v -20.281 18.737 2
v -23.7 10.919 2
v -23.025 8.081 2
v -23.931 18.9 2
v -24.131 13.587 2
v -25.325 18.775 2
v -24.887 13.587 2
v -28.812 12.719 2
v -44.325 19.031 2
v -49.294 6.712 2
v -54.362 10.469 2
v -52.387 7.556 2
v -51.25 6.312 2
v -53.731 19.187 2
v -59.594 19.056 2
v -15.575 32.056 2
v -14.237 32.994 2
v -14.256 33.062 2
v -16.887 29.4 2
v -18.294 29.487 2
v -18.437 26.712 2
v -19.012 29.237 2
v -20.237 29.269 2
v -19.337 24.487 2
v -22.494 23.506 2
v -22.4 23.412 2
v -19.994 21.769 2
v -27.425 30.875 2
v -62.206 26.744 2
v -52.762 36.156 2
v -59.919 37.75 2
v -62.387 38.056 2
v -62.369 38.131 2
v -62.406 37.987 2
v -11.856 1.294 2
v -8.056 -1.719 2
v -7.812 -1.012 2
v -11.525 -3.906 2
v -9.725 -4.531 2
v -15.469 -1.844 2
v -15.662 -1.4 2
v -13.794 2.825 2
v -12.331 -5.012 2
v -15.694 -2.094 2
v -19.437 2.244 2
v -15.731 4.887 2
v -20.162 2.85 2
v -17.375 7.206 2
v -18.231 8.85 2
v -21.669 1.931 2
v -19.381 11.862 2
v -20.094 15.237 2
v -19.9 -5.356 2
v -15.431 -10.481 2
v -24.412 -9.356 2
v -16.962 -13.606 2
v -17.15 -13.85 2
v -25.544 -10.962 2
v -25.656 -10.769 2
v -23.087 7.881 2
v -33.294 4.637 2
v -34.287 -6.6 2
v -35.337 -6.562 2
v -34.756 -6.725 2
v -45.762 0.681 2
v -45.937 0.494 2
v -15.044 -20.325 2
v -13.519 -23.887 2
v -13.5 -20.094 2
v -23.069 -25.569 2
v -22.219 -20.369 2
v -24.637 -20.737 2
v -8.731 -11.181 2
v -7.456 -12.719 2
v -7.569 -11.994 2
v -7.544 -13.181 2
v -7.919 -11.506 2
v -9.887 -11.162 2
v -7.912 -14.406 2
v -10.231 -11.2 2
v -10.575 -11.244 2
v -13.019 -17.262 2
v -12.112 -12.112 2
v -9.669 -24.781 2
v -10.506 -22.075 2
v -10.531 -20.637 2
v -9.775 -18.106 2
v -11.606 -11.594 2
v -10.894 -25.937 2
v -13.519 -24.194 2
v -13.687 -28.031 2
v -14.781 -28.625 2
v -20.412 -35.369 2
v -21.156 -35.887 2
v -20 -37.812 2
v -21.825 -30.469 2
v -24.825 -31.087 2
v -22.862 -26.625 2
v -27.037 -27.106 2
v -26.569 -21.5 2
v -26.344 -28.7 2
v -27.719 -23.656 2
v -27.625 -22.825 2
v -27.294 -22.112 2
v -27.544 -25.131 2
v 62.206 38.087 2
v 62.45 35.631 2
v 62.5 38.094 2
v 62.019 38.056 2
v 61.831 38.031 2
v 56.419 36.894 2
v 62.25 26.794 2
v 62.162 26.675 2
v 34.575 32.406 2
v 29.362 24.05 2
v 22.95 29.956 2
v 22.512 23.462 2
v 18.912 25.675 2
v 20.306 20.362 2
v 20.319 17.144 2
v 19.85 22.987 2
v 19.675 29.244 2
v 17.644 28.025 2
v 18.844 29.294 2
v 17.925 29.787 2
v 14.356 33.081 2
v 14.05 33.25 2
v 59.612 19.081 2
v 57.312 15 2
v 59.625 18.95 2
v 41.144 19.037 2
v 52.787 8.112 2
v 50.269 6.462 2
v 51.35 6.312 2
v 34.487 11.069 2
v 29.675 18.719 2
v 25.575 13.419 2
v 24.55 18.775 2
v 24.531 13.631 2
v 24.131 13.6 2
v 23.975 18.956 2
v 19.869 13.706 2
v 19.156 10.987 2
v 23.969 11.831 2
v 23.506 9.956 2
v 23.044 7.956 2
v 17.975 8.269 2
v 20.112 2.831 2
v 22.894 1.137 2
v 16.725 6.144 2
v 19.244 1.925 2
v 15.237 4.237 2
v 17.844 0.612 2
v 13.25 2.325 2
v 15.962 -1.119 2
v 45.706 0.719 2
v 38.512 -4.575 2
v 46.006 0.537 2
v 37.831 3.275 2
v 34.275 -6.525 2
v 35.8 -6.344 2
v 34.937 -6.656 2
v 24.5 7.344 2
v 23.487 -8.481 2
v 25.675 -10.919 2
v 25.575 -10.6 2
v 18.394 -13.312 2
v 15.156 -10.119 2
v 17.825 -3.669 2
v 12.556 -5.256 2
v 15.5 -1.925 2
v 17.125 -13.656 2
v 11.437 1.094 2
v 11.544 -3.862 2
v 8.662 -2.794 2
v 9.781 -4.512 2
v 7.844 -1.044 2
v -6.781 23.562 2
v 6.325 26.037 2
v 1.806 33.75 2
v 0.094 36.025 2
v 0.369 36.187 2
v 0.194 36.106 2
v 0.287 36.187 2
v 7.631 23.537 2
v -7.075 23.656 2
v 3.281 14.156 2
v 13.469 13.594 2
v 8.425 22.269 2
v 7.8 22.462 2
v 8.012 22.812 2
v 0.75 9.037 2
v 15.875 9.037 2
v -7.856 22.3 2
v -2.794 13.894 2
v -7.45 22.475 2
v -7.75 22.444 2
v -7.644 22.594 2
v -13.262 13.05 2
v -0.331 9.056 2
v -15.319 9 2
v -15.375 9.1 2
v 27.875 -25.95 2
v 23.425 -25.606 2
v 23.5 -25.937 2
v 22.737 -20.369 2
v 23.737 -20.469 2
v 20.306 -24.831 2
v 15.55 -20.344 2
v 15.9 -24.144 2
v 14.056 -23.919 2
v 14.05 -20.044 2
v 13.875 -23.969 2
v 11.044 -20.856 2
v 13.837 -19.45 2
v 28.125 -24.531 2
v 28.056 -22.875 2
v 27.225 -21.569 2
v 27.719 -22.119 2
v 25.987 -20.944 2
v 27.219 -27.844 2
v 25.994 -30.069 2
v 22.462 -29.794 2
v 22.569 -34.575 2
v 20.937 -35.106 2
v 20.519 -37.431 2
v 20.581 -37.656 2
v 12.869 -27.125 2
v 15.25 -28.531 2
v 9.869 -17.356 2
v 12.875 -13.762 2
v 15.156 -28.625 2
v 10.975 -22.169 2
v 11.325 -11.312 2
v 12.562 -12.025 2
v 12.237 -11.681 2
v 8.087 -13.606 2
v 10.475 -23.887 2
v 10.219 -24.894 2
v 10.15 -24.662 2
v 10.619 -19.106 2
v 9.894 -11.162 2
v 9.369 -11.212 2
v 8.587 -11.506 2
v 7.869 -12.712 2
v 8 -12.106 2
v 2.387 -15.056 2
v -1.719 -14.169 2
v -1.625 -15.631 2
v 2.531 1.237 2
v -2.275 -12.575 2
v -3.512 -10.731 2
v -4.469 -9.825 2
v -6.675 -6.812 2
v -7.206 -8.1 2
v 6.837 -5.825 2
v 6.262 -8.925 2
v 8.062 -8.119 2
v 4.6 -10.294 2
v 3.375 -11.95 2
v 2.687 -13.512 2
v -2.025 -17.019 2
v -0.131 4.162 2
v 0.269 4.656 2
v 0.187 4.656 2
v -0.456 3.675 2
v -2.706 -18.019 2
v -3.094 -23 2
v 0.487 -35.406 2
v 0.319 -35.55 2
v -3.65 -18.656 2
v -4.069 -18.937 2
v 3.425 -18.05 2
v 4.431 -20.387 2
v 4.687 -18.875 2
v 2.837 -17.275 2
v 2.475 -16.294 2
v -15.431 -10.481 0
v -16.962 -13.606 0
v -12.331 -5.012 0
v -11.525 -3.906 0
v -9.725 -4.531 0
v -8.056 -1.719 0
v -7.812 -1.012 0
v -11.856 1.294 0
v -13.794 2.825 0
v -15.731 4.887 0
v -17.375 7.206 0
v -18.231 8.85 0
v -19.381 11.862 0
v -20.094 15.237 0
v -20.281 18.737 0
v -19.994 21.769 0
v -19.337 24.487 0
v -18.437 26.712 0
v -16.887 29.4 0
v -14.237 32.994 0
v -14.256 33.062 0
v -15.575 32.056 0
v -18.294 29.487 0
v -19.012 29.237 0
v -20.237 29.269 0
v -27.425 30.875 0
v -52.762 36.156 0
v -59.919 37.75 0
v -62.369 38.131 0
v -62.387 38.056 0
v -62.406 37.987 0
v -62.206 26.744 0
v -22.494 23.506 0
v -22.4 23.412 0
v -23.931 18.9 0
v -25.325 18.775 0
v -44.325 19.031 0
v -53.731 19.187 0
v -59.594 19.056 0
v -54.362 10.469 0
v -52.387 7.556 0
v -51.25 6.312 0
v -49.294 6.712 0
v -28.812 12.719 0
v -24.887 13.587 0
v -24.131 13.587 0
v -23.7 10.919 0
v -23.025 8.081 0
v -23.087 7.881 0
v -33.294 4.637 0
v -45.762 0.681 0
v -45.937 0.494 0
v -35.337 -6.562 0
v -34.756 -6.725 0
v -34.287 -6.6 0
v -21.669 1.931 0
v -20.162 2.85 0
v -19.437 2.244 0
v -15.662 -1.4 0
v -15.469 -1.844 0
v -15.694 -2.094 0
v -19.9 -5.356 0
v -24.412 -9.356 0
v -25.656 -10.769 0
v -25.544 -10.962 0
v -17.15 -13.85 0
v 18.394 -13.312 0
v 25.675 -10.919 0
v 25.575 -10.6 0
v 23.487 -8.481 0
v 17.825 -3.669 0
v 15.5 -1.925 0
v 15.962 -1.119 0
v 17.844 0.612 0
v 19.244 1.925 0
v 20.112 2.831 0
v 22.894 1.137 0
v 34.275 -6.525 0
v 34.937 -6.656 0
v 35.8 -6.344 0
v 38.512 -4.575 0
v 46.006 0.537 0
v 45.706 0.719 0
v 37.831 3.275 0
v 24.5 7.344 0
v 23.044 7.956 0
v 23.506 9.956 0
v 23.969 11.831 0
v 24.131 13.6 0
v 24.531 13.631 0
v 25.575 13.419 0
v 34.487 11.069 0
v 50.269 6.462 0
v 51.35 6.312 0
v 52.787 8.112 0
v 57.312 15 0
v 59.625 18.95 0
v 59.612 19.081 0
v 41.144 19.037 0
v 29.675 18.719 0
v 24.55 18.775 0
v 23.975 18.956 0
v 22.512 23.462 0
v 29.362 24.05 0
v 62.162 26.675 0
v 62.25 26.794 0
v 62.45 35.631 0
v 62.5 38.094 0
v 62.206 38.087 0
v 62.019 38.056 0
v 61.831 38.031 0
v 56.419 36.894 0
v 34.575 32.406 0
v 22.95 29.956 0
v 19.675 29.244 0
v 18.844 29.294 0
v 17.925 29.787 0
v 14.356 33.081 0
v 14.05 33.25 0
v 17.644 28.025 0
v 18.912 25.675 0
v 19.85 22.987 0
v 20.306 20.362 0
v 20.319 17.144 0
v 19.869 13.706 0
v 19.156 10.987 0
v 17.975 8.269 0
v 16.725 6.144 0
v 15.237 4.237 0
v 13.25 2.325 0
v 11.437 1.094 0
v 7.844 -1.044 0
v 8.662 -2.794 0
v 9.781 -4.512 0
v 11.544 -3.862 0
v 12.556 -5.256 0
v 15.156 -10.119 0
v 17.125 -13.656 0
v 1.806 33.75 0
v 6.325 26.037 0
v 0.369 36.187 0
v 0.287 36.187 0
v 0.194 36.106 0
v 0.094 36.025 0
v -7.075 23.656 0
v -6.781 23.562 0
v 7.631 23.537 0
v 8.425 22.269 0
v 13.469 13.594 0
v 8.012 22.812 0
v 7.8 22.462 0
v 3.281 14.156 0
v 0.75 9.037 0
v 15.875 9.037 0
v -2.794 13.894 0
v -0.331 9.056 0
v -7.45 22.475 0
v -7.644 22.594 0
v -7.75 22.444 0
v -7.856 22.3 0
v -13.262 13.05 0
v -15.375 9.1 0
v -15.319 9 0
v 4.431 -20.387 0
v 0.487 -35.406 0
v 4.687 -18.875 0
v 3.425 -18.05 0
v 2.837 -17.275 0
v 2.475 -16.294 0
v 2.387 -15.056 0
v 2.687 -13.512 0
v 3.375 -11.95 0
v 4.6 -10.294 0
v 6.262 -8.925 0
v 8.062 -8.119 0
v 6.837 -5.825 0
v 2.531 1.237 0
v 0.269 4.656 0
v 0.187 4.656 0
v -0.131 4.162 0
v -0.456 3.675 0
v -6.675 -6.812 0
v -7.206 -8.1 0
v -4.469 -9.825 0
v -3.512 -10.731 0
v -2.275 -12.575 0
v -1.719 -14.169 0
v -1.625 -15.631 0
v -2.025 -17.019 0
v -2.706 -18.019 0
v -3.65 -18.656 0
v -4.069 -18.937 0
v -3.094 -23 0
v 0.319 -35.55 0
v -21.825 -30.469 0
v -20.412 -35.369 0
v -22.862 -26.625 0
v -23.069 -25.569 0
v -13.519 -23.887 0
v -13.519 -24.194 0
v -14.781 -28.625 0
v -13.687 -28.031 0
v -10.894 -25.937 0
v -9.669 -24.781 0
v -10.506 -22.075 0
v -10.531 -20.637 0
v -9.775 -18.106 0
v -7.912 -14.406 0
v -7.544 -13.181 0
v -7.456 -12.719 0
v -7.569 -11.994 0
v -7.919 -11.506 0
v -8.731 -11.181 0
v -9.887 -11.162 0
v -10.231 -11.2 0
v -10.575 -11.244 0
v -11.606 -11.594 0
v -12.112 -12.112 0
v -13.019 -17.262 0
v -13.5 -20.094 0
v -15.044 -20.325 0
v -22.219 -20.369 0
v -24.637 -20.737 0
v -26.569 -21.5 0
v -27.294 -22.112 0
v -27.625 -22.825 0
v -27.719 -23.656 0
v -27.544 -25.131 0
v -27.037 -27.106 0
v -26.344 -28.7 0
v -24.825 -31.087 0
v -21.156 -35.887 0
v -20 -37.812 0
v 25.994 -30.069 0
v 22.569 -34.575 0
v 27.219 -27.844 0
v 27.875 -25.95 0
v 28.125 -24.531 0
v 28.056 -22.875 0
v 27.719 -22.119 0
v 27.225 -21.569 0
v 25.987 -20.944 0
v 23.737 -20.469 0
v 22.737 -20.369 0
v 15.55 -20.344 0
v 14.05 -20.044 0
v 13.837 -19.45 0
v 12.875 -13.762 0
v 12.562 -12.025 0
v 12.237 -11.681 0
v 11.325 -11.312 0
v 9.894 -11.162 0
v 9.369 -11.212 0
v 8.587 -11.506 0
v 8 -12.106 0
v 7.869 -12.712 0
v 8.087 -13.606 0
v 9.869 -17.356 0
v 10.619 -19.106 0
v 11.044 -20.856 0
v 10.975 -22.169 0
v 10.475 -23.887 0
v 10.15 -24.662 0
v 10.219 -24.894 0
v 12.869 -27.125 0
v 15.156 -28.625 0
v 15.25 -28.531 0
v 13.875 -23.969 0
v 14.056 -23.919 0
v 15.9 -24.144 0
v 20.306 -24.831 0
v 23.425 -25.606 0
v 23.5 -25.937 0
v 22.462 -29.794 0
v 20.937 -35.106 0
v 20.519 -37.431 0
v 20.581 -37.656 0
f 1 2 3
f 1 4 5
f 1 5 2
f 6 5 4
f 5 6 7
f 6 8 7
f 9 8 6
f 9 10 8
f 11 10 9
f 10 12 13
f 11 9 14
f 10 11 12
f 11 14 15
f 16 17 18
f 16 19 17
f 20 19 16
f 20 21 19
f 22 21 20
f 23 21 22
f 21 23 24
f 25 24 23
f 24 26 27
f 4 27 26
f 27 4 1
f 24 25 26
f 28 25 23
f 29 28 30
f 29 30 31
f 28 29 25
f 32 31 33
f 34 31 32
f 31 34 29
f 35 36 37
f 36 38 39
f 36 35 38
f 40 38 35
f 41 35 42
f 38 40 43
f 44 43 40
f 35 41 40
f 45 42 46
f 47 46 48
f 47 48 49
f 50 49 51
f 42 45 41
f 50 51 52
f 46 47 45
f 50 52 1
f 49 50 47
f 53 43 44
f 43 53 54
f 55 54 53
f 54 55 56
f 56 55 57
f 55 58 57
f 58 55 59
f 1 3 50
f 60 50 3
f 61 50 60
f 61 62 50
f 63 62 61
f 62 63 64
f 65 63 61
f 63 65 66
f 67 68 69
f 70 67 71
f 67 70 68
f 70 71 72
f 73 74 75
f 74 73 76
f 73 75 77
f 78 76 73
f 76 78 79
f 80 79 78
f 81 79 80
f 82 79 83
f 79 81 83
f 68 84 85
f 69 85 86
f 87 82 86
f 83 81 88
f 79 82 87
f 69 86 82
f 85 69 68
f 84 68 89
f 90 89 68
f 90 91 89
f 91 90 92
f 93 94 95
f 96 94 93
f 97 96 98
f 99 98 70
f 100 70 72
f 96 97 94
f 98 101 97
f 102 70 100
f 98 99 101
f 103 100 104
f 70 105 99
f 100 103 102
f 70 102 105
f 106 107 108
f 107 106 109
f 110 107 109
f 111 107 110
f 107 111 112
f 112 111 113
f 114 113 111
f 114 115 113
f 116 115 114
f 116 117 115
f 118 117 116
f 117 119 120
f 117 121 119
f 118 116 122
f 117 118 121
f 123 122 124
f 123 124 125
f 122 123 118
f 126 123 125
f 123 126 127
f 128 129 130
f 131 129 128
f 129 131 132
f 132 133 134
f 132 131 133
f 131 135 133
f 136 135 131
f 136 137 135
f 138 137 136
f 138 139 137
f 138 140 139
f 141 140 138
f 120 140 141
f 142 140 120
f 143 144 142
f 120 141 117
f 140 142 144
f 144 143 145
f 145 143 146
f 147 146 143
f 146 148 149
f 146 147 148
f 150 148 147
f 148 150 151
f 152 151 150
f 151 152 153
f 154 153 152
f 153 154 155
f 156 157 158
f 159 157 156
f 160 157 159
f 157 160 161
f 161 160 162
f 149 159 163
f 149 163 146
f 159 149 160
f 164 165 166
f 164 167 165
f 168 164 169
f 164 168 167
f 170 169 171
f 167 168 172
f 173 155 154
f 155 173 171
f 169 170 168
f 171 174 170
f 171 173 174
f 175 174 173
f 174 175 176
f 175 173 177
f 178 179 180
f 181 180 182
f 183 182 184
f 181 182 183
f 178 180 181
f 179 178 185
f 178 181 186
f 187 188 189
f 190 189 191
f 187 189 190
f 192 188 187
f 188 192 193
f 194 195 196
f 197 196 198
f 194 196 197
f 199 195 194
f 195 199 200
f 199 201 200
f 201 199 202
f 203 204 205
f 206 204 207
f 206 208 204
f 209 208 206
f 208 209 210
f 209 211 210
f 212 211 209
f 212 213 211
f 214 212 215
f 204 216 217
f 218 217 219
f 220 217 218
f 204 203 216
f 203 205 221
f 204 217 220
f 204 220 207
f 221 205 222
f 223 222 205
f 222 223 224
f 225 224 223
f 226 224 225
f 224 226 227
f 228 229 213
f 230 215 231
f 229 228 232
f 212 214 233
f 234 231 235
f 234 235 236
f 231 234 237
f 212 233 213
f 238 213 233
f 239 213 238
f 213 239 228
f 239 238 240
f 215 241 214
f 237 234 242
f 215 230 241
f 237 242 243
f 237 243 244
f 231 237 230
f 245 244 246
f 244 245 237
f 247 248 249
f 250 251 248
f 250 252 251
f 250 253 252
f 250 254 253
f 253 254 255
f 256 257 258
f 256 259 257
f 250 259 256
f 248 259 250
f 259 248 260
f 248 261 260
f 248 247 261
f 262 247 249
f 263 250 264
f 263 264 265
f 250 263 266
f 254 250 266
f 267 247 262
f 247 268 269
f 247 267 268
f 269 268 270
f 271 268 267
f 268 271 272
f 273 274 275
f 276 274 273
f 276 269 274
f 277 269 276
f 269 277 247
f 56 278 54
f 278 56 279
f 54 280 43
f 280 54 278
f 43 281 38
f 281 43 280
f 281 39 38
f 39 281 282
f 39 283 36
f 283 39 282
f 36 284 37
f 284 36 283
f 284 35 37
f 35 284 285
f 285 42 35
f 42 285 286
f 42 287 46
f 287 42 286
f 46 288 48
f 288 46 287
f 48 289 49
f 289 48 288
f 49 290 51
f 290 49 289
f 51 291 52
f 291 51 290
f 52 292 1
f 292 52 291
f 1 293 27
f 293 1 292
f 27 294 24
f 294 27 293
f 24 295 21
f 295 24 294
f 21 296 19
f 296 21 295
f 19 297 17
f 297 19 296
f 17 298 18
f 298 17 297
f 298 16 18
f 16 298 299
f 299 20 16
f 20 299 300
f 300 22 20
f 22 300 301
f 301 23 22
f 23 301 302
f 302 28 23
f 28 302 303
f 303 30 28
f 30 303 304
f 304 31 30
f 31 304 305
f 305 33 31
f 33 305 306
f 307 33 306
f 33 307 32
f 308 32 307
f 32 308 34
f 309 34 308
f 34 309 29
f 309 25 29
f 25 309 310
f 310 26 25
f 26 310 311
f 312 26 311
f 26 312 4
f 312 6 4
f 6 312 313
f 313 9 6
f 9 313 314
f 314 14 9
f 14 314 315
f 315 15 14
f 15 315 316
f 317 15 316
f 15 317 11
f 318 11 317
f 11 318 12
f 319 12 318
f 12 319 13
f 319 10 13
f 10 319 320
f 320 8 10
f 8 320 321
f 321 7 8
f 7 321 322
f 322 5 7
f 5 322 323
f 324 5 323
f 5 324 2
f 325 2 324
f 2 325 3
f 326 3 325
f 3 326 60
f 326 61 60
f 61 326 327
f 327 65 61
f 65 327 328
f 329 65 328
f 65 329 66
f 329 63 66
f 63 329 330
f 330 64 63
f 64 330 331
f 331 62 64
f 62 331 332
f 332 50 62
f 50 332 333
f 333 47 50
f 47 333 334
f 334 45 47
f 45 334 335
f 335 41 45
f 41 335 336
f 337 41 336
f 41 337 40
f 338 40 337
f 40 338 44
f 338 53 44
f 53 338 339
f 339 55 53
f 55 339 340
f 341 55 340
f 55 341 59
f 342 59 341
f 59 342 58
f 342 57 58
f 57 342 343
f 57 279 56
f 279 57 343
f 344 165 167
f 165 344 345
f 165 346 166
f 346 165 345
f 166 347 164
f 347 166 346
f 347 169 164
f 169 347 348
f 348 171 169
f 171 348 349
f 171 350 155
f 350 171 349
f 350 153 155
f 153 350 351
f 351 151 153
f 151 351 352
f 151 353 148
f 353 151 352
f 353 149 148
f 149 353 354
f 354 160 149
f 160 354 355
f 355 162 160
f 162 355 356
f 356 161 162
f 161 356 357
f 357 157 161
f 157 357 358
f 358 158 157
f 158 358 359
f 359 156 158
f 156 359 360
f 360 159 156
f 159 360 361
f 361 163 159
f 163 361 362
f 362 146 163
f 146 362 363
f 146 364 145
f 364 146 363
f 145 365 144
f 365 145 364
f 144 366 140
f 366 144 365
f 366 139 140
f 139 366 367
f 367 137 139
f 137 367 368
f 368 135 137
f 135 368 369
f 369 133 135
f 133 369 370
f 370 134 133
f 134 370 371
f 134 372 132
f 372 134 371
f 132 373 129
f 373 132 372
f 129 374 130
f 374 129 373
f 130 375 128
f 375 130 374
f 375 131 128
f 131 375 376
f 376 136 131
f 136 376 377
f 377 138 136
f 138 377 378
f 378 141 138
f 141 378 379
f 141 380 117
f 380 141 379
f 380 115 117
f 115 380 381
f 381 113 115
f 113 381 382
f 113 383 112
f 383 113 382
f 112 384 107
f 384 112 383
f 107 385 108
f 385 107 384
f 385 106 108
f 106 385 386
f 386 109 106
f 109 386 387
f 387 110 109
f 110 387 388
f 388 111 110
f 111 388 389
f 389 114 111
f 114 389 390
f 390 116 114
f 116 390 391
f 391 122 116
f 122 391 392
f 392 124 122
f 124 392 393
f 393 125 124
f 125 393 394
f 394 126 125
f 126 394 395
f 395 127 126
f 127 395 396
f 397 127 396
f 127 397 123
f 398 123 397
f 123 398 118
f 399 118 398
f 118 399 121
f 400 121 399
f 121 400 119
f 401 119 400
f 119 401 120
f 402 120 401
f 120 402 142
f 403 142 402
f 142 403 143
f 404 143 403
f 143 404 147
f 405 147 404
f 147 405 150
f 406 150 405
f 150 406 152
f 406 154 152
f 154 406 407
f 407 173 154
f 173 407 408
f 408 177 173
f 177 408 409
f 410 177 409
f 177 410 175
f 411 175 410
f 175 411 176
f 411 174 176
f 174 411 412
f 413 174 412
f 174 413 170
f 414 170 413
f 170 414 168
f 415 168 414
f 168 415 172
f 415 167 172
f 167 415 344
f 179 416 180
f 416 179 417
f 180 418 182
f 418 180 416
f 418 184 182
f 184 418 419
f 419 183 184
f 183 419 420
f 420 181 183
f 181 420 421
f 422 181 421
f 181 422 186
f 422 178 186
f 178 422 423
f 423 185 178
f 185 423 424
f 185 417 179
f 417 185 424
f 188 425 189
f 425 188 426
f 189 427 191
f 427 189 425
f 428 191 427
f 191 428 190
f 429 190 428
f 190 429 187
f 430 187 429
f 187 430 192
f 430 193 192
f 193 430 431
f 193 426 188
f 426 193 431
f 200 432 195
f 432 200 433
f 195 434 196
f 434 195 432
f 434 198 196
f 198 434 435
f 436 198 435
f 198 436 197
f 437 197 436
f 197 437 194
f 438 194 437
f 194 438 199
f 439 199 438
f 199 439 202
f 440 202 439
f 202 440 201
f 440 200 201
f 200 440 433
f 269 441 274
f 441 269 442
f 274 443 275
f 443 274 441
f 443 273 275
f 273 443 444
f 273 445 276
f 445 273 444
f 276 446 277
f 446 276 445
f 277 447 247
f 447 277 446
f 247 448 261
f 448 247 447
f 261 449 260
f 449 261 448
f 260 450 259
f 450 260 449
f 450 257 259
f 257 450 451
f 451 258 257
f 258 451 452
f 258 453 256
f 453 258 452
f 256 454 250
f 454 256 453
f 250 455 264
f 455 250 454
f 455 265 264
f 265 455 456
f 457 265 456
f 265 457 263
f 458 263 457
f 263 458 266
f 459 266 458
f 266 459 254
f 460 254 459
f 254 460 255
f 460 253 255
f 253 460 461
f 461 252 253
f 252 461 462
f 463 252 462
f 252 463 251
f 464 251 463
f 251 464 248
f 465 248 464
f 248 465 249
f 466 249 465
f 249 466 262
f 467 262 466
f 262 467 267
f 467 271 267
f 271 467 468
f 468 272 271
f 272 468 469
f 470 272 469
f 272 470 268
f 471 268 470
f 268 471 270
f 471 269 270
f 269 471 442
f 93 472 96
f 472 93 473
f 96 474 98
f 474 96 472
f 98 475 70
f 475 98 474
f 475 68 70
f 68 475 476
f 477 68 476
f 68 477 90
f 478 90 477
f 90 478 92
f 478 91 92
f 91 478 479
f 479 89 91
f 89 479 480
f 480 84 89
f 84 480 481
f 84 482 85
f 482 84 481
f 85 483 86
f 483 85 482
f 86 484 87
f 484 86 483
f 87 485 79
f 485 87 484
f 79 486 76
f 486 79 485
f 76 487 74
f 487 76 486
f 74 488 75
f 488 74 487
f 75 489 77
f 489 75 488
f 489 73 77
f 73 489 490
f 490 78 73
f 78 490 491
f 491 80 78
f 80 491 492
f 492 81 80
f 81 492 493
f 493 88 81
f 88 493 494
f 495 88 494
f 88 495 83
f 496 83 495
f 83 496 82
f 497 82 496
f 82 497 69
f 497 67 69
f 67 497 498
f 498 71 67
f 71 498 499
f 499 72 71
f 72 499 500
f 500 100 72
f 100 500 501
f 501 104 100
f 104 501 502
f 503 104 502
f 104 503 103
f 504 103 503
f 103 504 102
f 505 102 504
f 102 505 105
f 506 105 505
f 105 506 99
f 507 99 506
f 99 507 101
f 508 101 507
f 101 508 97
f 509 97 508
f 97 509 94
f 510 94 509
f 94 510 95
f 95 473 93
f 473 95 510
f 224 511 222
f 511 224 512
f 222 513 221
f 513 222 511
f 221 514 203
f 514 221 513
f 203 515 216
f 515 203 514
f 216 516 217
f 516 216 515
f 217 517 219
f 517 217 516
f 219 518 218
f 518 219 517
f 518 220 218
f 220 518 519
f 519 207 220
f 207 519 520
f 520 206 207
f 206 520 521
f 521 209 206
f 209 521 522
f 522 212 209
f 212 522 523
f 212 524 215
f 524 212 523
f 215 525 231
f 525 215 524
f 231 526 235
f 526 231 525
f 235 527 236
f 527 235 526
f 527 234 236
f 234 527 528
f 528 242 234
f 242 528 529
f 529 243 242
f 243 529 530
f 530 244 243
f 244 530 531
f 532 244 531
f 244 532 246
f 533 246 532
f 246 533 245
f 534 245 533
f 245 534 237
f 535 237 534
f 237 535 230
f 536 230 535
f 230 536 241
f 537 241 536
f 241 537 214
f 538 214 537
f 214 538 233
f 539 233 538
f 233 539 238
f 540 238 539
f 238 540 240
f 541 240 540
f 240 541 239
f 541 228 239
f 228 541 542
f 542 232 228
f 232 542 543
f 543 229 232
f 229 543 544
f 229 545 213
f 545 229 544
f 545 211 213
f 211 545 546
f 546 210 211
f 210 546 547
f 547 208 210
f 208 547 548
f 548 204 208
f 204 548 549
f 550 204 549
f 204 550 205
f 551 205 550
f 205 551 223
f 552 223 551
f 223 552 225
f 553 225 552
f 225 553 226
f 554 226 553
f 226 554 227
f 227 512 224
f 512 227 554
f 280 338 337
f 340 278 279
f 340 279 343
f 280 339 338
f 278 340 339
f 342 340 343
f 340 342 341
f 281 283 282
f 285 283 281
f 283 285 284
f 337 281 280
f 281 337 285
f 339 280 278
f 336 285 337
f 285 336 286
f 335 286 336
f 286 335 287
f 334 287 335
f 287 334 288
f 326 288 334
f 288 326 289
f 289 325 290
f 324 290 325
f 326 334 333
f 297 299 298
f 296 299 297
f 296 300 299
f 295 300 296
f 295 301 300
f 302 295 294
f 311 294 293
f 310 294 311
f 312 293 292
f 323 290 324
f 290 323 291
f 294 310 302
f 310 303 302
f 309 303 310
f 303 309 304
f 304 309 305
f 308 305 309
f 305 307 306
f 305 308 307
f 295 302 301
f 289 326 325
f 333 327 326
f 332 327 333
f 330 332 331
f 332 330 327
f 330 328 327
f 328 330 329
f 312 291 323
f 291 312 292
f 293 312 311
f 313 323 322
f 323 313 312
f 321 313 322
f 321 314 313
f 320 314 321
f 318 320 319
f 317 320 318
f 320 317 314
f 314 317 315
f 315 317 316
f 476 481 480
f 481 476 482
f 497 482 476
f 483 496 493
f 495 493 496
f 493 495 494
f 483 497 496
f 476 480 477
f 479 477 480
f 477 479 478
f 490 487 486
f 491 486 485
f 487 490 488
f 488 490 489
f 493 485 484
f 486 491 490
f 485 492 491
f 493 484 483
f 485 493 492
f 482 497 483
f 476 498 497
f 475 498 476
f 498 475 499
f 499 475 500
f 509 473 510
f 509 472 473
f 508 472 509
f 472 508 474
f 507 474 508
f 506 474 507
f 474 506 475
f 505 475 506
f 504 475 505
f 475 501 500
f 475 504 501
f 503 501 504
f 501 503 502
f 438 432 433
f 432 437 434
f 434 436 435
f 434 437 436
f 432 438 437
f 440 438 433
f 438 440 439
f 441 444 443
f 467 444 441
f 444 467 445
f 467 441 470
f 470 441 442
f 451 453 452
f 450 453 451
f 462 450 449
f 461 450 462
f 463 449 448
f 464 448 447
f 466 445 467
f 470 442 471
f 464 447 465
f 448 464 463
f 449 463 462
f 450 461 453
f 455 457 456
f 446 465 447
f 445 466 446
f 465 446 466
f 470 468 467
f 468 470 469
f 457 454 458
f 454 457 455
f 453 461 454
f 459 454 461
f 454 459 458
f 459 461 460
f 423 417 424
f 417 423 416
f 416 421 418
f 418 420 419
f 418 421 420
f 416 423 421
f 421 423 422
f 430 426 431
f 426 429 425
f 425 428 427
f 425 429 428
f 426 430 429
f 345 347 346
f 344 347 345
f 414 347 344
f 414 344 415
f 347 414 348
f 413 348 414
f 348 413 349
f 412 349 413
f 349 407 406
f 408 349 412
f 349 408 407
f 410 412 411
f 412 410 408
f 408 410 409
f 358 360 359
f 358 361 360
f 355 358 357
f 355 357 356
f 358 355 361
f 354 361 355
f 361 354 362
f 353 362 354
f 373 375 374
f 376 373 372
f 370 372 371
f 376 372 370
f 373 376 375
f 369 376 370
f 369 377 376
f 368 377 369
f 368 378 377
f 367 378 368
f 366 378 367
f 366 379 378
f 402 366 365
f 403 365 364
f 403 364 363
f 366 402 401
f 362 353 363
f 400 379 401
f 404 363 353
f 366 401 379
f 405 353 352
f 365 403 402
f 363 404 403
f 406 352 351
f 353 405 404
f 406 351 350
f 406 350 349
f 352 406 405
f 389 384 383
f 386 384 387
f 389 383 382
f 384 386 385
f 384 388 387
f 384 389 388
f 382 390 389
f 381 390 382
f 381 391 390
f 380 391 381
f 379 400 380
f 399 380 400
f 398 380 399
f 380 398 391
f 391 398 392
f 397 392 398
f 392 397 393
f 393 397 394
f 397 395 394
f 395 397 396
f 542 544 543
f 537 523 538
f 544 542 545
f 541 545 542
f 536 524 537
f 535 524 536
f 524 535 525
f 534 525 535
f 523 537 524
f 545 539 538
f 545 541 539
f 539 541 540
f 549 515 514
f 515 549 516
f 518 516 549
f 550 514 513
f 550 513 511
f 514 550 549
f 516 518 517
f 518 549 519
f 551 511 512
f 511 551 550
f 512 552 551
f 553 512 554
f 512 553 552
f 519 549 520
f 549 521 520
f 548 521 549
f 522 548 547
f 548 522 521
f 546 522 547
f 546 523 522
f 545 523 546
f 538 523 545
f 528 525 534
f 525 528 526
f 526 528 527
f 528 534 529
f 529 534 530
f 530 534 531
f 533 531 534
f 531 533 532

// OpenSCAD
module 1a48b21496cfd37aac519bf5acd59b03_1()
{
 /* Generated by trace2scad version 20150415
    http://aggregate.org/MAKE/TRACE2SCAD/
    Optimized model has 279/3846 original points
 */
 color([0.48, 0.48, 0.48])
 assign(minx=0) /* polygon minx=15 */
 assign(miny=0) /* polygon miny=75 */
 assign(maxx=20000) /* polygon maxx=20000 */
 assign(maxy=12250) /* polygon maxy=12226 */
 assign(dx=maxx-minx)
 assign(dy=maxy-miny)
 assign(maxd=((dx>dy)?dx:dy))
 scale([1/maxd, 1/maxd, 1])
 translate([-minx-dx/2, -miny-dy/2, 0])
 linear_extrude(height=1, convexity=279)
 union() {
  union() {
   polygon([[18,12214],[15,12203],[47,10404],[6401,9886],[6416,9871],[6171,9149],[5948,9129],[2908,9170],[1403,9195],[465,9174],[1302,7800],[1618,7334],[1800,7135],[2113,7199],[5390,8160],[6018,8299],[6139,8299],[6208,7872],[6316,7418],[6306,7386],[4673,6867],[2678,6234],[2650,6204],[4346,5075],[4439,5049],[4514,5069],[6533,6434],[6774,6581],[6890,6484],[7494,5901],[7525,5830],[7489,5790],[6816,5268],[6094,4628],[5895,4402],[5913,4371],[7256,3909],[7286,3948],[7531,4448],[8027,5323],[8156,5500],[8444,5400],[8711,5850],[8750,5963],[8103,6332],[7793,6577],[7483,6907],[7220,7278],[7083,7541],[6899,8023],[6785,8563],[6755,9123],[6801,9608],[6906,10043],[7050,10399],[7298,10829],[7722,11404],[7719,11415],[7508,11254],[7073,10843],[6958,10803],[6762,10808],[5612,11065],[1558,11910],[413,12165],[21,12226]], convexity=24);
   polygon([[19923,12214],[19893,12210],[19027,12028],[15532,11310],[13672,10918],[13148,10804],[13015,10812],[12868,10891],[12297,11418],[12248,11445],[12823,10609],[13026,10233],[13176,9803],[13249,9383],[13251,8868],[13179,8318],[13065,7883],[12876,7448],[12676,7108],[12438,6803],[12120,6497],[11830,6300],[11255,5958],[11386,5678],[11565,5403],[11847,5507],[12009,5284],[12425,4506],[12740,3940],[12943,3995],[14108,4378],[14092,4429],[13758,4768],[12852,5538],[12480,5817],[12554,5946],[12855,6223],[13079,6433],[13218,6578],[13663,6307],[15484,5081],[15590,5060],[15728,5110],[16162,5393],[17361,6211],[17313,6240],[16053,6649],[13920,7300],[13687,7398],[13761,7718],[13835,8018],[13861,8301],[13925,8306],[14092,8272],[15518,7896],[18043,7159],[18216,7135],[18446,7423],[19170,8525],[19540,9157],[19538,9178],[16583,9171],[14748,9120],[13928,9129],[13836,9158],[13602,9879],[14698,9973],[19946,10393],[19960,10412],[19992,11826],[20000,12220],[19953,12219]], convexity=23);
   polygon([[10031,11902],[10015,11889],[8868,9910],[8915,9895],[11221,9891],[11012,10291],[10289,11525],[10059,11915],[10046,11915]], convexity=5);
   polygon([[11265,9747],[11248,9719],[10525,8390],[10120,7571],[12540,7571],[12155,8300],[11348,9688],[11282,9775]], convexity=5);
   polygon([[8760,9716],[8743,9693],[7878,8213],[7540,7581],[7549,7565],[9947,7574],[9553,8348],[8808,9721],[8777,9740]], convexity=6);
   polygon([[9979,6791],[9927,6713],[8932,5035],[8847,4829],[9285,4553],[9438,4408],[9636,4113],[9725,3858],[9740,3624],[9676,3402],[9567,3242],[9416,3140],[9349,3095],[9505,2445],[10051,437],[10078,460],[10709,2863],[10750,3105],[10548,3237],[10454,3361],[10396,3518],[10382,3716],[10430,3963],[10540,4213],[10736,4478],[11002,4697],[11290,4826],[11094,5193],[10405,6323],[10043,6870],[10030,6870]], convexity=10);
   polygon([[8363,4333],[8308,4326],[8143,4270],[8062,4187],[7917,3363],[7840,2910],[7593,2873],[6445,2866],[6058,2807],[5749,2685],[5633,2587],[5580,2473],[5565,2340],[5593,2104],[5674,1788],[5785,1533],[6028,1151],[6615,383],[6800,75],[6734,466],[6508,1250],[6342,1865],[6309,2034],[7837,2303],[7837,2254],[7635,1545],[7810,1640],[8257,1975],[8453,2160],[8319,2593],[8315,2823],[8436,3228],[8734,3820],[8793,4016],[8807,4090],[8789,4206],[8733,4284],[8603,4336],[8418,4339]], convexity=12);
   polygon([[11541,4335],[11499,4331],[11374,4284],[11280,4188],[11259,4091],[11294,3948],[11579,3348],[11699,3068],[11767,2788],[11756,2578],[11676,2303],[11624,2179],[11635,2142],[12059,1785],[12425,1545],[12440,1560],[12220,2290],[12249,2298],[12544,2262],[13249,2152],[13748,2028],[13760,1975],[13594,1358],[13350,508],[13283,136],[13293,100],[13611,593],[14159,1314],[14355,1670],[14460,1973],[14500,2200],[14489,2465],[14435,2586],[14356,2674],[14158,2774],[13798,2850],[13638,2866],[12488,2870],[12248,2918],[12214,3013],[12060,3923],[12010,4201],[11958,4256],[11812,4315],[11583,4339]], convexity=14);
  }
 }
}

module 1a48b21496cfd37aac519bf5acd59b03()
{
 /* all layers combined, scaled to within a 1mm cube */
 scale([1, 1, 1/1])
 difference() {
  union() {
   scale([1,1,2]) translate([0,0,-0.5]) 1a48b21496cfd37aac519bf5acd59b03_1();
  }
  translate([0,0,-2]) cube([2,2,4],center=true);
 }
}

scale([125, 125, 2]) {
	1a48b21496cfd37aac519bf5acd59b03();
}
